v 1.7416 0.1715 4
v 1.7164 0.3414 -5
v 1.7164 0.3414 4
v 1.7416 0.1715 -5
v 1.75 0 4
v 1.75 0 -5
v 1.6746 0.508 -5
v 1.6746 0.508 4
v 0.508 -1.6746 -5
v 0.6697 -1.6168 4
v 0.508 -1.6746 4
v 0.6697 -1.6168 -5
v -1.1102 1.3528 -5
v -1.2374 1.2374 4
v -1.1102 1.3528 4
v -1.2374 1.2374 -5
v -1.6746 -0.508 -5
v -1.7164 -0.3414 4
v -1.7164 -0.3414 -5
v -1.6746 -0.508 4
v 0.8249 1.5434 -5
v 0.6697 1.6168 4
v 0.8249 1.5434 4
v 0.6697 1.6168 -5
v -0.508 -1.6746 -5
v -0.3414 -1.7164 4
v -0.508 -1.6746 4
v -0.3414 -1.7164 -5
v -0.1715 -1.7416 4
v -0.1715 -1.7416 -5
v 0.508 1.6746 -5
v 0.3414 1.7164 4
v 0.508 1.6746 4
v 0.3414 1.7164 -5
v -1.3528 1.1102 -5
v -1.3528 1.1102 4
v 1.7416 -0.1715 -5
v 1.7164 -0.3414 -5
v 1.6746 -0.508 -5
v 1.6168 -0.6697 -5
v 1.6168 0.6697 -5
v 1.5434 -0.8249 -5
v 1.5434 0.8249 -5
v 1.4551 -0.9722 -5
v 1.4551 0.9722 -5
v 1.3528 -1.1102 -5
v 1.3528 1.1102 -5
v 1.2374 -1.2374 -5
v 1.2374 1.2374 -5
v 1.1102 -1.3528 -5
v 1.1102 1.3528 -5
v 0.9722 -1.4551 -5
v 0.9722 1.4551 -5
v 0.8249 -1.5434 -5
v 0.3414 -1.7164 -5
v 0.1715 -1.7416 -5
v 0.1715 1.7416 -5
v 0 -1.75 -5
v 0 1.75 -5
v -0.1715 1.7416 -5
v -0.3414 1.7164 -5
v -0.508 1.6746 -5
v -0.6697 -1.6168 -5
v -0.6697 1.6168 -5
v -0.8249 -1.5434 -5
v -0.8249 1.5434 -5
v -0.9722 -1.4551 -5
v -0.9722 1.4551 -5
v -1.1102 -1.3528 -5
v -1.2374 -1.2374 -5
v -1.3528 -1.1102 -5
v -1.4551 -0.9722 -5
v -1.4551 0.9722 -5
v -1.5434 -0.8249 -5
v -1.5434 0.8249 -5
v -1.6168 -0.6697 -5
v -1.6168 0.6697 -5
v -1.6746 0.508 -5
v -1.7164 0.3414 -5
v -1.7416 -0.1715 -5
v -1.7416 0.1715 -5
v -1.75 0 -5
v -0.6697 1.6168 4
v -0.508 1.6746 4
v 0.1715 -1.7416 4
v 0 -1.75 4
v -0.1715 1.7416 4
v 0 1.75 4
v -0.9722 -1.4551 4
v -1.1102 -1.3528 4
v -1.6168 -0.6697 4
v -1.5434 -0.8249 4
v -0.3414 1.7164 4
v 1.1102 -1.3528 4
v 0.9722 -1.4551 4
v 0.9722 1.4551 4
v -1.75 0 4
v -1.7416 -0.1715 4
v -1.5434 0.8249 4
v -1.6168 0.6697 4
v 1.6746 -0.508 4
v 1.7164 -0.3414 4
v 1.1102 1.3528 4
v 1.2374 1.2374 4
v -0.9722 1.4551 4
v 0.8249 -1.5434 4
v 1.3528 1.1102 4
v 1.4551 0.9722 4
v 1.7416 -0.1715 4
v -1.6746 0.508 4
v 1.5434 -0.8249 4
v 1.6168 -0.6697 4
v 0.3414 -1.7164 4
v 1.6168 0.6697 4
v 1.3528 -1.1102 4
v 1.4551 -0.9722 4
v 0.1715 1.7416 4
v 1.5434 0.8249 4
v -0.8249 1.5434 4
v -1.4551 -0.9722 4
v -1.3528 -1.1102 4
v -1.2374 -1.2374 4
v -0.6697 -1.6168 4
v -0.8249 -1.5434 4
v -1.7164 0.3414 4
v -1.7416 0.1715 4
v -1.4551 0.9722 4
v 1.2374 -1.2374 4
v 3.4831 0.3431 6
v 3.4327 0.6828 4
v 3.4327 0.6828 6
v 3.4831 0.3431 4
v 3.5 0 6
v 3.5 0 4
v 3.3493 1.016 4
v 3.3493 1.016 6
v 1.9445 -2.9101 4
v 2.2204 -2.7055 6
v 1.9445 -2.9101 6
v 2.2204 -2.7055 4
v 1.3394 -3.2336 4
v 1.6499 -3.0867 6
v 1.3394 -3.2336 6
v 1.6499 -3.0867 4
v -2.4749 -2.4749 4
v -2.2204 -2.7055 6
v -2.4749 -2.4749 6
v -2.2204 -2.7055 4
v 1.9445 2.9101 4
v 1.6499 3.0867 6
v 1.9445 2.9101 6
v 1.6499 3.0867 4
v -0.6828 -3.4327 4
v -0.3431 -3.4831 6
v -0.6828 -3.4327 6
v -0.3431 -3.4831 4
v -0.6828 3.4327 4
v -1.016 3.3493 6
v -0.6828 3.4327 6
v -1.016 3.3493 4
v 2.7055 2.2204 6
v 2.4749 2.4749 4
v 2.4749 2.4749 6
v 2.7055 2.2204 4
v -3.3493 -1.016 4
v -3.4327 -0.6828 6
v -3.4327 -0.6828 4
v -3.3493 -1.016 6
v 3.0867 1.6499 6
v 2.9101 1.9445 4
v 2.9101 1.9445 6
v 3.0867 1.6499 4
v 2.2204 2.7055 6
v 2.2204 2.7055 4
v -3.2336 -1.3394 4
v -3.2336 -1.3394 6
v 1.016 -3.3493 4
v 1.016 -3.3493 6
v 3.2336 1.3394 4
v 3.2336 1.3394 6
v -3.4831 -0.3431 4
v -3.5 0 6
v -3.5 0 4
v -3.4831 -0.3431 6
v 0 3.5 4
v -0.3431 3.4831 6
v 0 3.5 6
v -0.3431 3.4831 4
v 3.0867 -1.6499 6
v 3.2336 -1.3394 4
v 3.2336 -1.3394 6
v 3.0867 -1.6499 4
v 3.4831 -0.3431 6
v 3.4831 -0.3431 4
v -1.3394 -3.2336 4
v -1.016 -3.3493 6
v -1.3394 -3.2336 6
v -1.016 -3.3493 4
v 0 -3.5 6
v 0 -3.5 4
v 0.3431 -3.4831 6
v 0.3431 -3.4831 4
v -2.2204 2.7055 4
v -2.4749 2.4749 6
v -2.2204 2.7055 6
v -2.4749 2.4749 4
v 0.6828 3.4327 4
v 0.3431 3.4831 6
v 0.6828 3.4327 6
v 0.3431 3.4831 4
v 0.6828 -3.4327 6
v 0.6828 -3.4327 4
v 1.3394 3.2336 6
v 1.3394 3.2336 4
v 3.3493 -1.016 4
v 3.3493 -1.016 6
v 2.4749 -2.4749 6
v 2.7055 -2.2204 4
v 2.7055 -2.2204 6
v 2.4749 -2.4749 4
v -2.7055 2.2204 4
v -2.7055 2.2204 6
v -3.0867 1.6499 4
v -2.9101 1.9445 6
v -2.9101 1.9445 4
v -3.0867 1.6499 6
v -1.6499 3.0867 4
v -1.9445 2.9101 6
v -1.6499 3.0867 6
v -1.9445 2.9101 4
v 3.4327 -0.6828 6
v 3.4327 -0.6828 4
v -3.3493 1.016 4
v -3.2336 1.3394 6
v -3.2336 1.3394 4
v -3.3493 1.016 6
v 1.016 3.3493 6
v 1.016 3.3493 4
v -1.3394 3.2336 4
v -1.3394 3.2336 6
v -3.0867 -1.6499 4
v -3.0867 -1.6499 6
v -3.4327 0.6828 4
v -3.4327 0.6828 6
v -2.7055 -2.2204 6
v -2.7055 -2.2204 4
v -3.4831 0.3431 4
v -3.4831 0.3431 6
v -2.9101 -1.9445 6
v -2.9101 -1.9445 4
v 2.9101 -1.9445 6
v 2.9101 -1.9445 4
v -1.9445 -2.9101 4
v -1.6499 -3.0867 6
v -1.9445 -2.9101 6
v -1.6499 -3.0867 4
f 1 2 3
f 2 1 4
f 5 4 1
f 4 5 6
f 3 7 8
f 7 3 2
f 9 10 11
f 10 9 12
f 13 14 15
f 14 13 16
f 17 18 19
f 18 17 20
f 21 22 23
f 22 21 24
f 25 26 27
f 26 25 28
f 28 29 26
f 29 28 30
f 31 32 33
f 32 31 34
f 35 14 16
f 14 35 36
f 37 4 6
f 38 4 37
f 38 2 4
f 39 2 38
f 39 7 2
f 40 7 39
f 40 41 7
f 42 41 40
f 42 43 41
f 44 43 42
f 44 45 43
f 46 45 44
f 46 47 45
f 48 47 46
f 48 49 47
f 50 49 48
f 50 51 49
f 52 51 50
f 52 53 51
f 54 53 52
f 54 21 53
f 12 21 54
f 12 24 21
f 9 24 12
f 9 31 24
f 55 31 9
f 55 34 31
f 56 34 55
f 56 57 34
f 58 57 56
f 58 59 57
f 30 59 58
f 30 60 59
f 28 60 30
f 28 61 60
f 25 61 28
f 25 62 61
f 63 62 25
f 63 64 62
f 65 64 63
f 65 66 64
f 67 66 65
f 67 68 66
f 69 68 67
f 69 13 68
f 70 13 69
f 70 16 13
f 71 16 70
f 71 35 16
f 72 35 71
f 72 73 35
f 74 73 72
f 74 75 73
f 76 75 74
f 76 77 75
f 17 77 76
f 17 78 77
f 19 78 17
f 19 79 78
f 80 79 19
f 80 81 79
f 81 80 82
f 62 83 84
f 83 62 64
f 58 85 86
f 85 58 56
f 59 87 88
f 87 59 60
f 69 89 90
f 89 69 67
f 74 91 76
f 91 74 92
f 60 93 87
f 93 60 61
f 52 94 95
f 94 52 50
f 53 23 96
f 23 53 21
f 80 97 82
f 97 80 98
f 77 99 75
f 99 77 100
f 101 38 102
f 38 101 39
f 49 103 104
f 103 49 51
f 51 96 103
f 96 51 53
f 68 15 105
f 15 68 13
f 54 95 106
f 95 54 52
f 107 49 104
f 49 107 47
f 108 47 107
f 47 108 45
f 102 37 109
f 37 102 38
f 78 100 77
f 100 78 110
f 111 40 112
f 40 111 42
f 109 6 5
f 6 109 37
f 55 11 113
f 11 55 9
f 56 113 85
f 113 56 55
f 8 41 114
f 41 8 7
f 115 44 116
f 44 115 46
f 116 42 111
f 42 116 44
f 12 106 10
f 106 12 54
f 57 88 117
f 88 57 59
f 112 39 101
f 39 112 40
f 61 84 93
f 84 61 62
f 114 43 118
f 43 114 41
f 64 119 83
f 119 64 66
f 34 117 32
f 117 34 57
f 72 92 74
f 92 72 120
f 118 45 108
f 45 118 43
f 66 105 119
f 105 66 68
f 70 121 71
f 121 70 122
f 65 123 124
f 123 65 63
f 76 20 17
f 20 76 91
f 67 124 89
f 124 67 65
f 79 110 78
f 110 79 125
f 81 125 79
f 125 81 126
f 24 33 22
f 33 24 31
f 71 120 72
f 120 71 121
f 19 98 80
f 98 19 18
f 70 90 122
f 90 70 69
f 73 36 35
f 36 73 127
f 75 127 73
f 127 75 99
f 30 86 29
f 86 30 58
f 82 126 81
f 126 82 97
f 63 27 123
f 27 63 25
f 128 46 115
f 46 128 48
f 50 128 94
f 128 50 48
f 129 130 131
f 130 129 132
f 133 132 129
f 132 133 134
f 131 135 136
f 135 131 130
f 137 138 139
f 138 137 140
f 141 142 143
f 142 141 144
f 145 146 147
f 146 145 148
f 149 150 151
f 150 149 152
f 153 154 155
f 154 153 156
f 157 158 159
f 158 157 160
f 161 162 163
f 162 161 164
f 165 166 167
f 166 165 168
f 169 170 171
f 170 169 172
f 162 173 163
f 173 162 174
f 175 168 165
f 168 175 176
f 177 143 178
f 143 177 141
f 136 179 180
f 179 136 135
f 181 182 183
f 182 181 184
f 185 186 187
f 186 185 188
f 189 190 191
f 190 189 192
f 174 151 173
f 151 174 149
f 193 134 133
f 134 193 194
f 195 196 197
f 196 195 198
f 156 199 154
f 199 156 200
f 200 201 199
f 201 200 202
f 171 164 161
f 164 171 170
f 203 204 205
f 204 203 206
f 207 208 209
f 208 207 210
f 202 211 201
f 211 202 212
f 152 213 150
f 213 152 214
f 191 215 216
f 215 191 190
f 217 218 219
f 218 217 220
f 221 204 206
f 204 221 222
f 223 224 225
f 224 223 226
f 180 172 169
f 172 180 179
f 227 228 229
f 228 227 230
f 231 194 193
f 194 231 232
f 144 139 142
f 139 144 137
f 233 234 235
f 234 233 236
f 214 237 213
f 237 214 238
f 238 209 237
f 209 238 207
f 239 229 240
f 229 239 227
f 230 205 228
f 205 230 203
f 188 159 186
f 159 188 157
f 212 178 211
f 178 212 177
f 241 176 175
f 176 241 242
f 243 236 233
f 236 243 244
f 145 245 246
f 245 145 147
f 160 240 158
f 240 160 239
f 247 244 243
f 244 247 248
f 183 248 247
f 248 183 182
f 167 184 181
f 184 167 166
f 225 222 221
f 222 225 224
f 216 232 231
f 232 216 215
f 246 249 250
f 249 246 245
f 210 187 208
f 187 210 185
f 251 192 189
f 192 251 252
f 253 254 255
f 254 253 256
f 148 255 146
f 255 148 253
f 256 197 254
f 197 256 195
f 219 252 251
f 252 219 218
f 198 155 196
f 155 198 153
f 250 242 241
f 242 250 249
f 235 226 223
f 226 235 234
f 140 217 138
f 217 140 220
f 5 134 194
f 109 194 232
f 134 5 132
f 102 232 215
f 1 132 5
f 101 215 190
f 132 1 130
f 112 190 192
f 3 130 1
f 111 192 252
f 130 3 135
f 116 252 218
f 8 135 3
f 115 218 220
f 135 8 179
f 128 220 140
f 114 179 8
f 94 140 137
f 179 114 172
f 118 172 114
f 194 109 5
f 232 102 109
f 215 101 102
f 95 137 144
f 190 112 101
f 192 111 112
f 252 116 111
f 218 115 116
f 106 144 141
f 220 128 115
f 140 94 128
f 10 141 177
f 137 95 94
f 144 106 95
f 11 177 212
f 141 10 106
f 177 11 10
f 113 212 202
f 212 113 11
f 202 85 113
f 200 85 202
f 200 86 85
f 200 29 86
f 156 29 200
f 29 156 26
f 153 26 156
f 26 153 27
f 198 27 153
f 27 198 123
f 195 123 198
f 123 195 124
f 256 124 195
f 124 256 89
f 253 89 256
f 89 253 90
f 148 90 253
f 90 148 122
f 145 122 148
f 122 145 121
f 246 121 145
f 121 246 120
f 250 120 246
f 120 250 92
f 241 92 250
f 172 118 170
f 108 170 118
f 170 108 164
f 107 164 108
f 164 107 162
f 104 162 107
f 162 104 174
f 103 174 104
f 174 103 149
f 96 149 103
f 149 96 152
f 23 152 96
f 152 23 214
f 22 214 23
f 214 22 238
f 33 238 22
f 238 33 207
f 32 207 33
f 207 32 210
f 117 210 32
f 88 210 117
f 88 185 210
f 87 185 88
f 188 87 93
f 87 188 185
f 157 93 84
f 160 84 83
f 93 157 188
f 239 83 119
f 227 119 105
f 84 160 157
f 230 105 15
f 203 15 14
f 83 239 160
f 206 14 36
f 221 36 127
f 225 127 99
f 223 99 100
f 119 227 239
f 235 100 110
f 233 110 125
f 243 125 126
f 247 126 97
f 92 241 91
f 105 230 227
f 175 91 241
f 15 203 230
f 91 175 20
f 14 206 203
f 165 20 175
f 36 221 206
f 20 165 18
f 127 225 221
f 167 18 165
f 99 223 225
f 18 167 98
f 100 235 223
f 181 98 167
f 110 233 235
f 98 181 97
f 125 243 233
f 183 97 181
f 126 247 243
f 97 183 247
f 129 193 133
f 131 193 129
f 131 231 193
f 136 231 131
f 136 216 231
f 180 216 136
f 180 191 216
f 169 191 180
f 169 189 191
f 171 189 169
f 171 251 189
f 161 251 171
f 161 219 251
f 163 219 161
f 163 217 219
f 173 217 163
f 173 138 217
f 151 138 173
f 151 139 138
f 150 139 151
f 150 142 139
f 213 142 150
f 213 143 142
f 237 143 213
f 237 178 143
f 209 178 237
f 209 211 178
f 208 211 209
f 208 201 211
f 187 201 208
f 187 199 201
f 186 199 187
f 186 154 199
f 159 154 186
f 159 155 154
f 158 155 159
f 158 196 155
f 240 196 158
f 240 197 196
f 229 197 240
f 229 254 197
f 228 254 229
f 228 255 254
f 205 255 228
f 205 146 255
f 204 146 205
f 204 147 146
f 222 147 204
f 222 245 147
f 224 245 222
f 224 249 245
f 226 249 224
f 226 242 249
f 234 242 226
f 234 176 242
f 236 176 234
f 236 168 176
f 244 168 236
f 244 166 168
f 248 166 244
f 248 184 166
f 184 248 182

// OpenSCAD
module screw() {
    $fn = 64;
    union() {
        // Screw shaft
        cylinder(d = 3.5, h = 10, center = true);
        
        // Screw head
        translate([0, 0, 5])
            cylinder(d = 7.0, h = 2, center = true);
    }
}

screw();
